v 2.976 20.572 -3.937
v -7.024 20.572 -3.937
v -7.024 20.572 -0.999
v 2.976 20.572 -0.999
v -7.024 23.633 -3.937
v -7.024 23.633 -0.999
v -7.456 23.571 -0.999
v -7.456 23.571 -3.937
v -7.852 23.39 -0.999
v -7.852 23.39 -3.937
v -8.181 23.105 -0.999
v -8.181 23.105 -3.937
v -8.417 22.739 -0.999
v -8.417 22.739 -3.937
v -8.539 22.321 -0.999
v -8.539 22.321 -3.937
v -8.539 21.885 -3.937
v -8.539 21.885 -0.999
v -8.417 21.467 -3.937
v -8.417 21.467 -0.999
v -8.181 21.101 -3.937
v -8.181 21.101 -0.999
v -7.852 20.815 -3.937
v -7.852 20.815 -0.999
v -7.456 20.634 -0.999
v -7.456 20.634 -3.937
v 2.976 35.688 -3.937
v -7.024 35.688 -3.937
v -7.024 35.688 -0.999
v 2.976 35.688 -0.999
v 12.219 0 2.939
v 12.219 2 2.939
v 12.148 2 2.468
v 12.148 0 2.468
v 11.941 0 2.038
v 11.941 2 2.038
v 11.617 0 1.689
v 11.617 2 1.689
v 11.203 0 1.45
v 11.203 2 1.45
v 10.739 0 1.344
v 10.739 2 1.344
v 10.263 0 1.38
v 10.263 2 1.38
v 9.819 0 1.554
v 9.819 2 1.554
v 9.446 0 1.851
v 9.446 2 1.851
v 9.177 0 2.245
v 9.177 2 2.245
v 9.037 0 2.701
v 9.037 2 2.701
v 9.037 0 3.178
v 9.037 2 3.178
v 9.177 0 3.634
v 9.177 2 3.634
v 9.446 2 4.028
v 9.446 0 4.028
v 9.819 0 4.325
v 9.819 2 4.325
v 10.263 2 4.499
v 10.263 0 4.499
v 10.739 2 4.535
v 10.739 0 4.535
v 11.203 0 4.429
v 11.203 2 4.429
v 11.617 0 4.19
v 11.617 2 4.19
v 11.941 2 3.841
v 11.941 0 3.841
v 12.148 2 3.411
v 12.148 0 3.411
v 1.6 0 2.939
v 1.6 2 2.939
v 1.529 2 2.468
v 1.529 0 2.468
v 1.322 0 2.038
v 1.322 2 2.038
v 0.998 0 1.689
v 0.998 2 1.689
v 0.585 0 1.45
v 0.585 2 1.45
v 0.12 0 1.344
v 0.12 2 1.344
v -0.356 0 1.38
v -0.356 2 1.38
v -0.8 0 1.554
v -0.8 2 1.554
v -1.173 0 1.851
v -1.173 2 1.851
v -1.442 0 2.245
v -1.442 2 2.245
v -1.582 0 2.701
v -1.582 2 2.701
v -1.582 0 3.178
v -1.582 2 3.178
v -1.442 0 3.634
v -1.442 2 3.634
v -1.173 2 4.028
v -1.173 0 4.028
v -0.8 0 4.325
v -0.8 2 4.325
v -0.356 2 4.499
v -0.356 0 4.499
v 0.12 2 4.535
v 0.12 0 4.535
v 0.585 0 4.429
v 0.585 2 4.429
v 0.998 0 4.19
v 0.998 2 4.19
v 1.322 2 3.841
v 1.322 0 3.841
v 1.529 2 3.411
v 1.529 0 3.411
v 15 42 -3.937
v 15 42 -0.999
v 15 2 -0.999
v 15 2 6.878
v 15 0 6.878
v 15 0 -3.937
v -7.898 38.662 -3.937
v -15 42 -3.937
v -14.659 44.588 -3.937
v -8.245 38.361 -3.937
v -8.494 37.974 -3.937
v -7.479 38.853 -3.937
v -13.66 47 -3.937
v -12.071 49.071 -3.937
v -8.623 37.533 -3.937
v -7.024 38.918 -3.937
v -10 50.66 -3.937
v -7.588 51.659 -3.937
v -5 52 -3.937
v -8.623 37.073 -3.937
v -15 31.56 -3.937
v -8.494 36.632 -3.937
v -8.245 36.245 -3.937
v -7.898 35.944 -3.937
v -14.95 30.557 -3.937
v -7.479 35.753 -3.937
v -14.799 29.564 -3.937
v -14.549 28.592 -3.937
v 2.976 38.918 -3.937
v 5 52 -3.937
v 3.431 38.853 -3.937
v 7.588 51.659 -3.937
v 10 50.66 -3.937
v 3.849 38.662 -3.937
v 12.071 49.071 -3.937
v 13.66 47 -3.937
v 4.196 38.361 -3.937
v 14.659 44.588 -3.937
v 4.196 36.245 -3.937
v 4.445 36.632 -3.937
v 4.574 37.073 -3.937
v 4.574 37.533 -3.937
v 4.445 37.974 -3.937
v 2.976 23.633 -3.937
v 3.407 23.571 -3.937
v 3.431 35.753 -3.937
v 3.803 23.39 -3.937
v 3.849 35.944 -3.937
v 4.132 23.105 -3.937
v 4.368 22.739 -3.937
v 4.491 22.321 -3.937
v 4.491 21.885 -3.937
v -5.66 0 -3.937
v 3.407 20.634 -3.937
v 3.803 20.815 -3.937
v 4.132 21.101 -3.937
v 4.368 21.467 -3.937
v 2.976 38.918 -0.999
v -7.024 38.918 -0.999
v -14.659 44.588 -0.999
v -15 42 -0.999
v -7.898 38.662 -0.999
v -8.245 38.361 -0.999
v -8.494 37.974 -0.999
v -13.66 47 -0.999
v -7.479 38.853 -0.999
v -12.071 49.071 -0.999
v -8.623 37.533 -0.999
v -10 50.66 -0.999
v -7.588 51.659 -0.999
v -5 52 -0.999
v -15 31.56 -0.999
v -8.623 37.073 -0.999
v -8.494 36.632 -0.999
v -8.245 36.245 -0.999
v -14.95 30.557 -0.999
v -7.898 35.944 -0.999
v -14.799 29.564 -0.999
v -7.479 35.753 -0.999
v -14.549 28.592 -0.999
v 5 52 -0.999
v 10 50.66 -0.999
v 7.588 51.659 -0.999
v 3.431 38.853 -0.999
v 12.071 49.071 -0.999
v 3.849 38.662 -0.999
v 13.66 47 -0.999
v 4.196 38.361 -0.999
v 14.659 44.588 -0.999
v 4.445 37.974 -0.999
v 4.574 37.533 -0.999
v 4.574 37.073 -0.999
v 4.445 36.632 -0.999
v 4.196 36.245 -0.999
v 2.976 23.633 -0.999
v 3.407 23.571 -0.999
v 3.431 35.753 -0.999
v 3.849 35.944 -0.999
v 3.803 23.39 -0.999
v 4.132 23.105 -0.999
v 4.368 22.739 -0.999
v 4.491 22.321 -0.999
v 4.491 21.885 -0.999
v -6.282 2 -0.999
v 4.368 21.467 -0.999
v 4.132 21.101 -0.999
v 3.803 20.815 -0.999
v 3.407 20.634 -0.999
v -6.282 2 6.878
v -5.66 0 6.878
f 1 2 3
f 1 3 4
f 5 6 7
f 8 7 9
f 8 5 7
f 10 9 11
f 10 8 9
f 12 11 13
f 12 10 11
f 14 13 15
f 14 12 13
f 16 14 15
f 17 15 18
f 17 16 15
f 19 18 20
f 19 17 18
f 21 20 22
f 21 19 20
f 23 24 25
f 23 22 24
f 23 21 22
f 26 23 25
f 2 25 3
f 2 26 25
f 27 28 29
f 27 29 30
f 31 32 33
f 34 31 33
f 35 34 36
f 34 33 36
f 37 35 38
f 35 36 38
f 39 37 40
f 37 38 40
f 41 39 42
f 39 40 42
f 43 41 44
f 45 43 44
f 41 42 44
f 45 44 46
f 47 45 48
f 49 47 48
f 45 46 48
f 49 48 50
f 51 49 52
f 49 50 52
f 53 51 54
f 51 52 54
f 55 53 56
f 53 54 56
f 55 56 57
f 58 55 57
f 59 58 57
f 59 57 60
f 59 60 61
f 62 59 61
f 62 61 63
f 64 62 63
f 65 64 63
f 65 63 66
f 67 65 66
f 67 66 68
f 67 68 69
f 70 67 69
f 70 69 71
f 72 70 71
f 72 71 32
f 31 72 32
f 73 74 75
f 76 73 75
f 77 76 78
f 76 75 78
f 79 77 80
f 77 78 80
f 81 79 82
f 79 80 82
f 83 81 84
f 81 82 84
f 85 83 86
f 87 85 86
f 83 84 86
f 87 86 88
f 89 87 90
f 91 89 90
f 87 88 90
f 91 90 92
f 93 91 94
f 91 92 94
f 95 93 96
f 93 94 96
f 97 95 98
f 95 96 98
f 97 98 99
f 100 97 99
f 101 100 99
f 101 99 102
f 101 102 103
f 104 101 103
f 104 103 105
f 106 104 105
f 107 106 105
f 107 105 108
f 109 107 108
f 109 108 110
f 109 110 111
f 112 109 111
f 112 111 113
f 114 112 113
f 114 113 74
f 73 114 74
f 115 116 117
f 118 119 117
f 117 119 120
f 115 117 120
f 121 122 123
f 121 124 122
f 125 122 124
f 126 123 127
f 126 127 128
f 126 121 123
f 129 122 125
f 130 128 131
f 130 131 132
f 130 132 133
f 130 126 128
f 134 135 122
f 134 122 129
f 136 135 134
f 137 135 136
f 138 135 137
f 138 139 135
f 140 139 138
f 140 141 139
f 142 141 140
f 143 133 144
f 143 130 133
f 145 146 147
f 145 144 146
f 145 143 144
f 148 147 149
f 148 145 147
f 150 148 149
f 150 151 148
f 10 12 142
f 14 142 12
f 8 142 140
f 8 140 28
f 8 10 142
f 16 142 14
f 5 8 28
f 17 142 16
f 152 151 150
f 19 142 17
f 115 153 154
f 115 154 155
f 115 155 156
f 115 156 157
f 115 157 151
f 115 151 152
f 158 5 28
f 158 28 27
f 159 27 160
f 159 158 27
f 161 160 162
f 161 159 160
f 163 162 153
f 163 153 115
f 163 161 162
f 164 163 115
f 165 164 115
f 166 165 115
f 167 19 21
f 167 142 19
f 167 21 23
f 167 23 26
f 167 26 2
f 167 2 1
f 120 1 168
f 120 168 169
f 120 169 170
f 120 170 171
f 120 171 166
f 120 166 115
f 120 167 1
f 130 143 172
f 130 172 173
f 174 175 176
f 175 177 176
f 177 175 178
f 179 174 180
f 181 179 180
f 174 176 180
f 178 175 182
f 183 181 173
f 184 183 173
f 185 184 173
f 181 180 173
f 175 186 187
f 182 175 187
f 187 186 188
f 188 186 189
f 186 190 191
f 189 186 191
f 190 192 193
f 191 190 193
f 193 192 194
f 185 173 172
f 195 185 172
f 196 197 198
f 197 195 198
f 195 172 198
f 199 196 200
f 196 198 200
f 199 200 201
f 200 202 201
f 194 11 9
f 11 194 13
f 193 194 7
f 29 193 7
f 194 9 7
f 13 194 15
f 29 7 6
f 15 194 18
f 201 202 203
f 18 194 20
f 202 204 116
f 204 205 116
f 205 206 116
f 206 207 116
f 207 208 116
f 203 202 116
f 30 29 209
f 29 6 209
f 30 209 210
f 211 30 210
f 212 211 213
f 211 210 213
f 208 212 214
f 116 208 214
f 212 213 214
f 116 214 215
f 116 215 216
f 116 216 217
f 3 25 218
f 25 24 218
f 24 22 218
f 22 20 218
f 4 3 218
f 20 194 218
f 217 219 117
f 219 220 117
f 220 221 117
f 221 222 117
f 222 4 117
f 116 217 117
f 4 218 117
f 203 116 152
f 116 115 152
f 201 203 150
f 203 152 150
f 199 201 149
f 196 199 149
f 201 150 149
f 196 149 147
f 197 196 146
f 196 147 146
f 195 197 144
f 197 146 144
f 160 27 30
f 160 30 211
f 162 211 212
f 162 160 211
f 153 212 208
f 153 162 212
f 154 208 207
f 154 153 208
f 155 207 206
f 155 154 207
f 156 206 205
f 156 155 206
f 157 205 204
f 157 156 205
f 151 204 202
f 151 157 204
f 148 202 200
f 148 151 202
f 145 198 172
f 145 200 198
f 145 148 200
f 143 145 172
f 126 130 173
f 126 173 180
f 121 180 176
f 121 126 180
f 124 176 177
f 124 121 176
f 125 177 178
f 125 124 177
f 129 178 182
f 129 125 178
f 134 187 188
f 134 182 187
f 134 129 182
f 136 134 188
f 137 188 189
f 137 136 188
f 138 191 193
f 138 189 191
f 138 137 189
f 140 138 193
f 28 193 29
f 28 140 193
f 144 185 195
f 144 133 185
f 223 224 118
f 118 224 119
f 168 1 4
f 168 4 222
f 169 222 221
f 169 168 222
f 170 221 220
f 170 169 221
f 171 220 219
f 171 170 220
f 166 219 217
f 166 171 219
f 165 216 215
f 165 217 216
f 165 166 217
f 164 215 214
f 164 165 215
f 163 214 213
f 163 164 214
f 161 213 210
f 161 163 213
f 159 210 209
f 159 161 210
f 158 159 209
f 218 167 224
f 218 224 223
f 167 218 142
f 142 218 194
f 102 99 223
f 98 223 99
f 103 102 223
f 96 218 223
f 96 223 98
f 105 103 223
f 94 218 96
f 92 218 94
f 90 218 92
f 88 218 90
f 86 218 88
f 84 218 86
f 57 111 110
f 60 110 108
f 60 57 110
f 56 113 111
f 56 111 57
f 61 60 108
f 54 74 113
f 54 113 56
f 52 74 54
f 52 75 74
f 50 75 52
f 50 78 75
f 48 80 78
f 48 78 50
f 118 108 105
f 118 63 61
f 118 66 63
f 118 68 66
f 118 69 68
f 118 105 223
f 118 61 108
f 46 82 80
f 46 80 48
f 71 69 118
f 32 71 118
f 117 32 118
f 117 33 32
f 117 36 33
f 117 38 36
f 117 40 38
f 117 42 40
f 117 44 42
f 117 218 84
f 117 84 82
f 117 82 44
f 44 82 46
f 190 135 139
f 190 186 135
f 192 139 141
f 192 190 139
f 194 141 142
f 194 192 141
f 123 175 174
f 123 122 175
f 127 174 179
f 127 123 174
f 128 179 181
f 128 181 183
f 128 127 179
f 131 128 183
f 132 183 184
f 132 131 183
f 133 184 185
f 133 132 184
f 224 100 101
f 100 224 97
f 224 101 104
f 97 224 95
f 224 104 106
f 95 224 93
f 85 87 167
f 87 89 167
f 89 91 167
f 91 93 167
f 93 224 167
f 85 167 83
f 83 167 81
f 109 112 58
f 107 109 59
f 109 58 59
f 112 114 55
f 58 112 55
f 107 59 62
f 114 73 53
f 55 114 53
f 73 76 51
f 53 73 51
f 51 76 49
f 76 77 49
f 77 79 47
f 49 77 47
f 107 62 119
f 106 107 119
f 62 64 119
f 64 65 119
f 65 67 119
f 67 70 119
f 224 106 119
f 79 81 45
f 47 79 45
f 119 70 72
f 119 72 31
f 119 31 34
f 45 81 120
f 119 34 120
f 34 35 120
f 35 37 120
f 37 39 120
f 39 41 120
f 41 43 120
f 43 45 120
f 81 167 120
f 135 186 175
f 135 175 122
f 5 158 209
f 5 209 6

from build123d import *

# Parameters (mm, degrees)
SKETCH1_W                      = 30
SKETCH1_H                      = 10.814576134
BOSS_EXTRUDE1_DEPTH            = 2
SKETCH2_W                      = 30
SKETCH2_H                      = 2.938330184
BOSS_EXTRUDE2_DEPTH            = 50
CUT_EXTRUDE1_DEPTH             = 11.814576135
CUT_EXTRUDE2_REACH             = 4
SKETCH4_R                      = 1.6
CUT_EXTRUDE3_REACH             = 8.878
CUT_EXTRUDE3_DIRECTION_2_REACH = 5.937
FILLET1_R                      = 10


with BuildPart() as part:
    # Sketch1 → Boss-Extrude1 (new body)
    with BuildSketch(Plane(origin=(0, 0, 0), x_dir=(1, 0, 0), z_dir=(0, 1, 0))):
        with Locations((0, -1.470280193)):
            Rectangle(SKETCH1_W, SKETCH1_H)
    extrude(amount=BOSS_EXTRUDE1_DEPTH)

    # Sketch2 → Boss-Extrude2 (add)
    with BuildSketch(Plane(origin=(0, 2, 0), x_dir=(1, 0, 0), z_dir=(0, 1, 0))):
        with Locations((0, 2.467842782)):
            Rectangle(SKETCH2_W, SKETCH2_H)
    extrude(amount=BOSS_EXTRUDE2_DEPTH)

    # Sketch3 → Cut-Extrude1 (cut, through all)
    with BuildSketch(Plane(origin=(0, 0, -3.937007874), x_dir=(-1, 0, 0), z_dir=(0, 0, -1))):
        with BuildLine():
            Line((-2.975613291, 38.918099038), (7.024386709, 38.918099038))
            ThreePointArc((7.024386709, 38.918099038), (8.639544063, 37.302941685), (7.024386709, 35.687784331))
            Line((7.024386709, 35.687784331), (-2.975613291, 35.687784331))
            ThreePointArc((-2.975613291, 35.687784331), (-4.590770645, 37.302941685), (-2.975613291, 38.918099038))
        make_face()
        with BuildLine():
            Line((-2.975613291, 23.633431947), (7.024386709, 23.633431947))
            ThreePointArc((7.024386709, 23.633431947), (8.554876972, 22.102941685), (7.024386709, 20.572451422))
            Line((7.024386709, 20.572451422), (-2.975613291, 20.572451422))
            ThreePointArc((-2.975613291, 20.572451422), (-4.506103554, 22.102941685), (-2.975613291, 23.633431947))
        make_face()
    extrude(amount=-CUT_EXTRUDE1_DEPTH, mode=Mode.SUBTRACT)

    # Sketch4 → Cut-Extrude2 (cut, up to next)
    with BuildSketch(Plane(origin=(0, 2, 0), x_dir=(1, 0, 0), z_dir=(0, 1, 0)), mode=Mode.PRIVATE) as cut_extrude2_sk1:
        with Locations((10.61893739, -2.939445285)):
            Circle(SKETCH4_R)
    cut_extrude2_tool1 = extrude(cut_extrude2_sk1.sketch, amount=-CUT_EXTRUDE2_REACH, mode=Mode.PRIVATE) & part.part
    add(cut_extrude2_tool1.solids().sort_by_distance((10.618937, 2, 2.939445))[0], mode=Mode.SUBTRACT)
    # Sketch4 → Cut-Extrude2 (cut, up to next)
    with BuildSketch(Plane(origin=(0, 2, 0), x_dir=(1, 0, 0), z_dir=(0, 1, 0)), mode=Mode.PRIVATE) as cut_extrude2_sk2:
        with Locations((0, -2.939445285)):
            Circle(SKETCH4_R)
    cut_extrude2_tool2 = extrude(cut_extrude2_sk2.sketch, amount=-CUT_EXTRUDE2_REACH, mode=Mode.PRIVATE) & part.part
    add(cut_extrude2_tool2.solids().sort_by_distance((0, 2, 2.939445))[0], mode=Mode.SUBTRACT)

    # Sketch5 → Cut-Extrude3 (cut, up to next)
    with BuildSketch(Plane.XY, mode=Mode.PRIVATE) as cut_extrude3_sk1:
        Polygon((-4.080923029, -5.080850433), (-16.955695167, 36.332562893), (-18.585937562, -5.080850433), align=None)
    cut_extrude3_tool1 = extrude(cut_extrude3_sk1.sketch, amount=CUT_EXTRUDE3_REACH, mode=Mode.PRIVATE) & part.part
    add(cut_extrude3_tool1.solids().sort_by_distance((-13.207519, 8.723621, 0))[0], mode=Mode.SUBTRACT)

    # Sketch5 → Cut-Extrude3 direction 2 (cut, up to next)
    with BuildSketch(Plane.XY, mode=Mode.PRIVATE) as cut_extrude3_direction_2_sk1:
        Polygon((-4.080923029, -5.080850433), (-16.955695167, 36.332562893), (-18.585937562, -5.080850433), align=None)
    cut_extrude3_direction_2_tool1 = extrude(cut_extrude3_direction_2_sk1.sketch, amount=-CUT_EXTRUDE3_DIRECTION_2_REACH, mode=Mode.PRIVATE) & part.part
    add(cut_extrude3_direction_2_tool1.solids().sort_by_distance((-13.207519, 8.723621, 0))[0], mode=Mode.SUBTRACT)

    # Fillet1
    fillet1_edges = [part.edges().sort_by_distance(p)[0] for p in [
        (15, 52, -2.467842782),
        (-15, 52, -2.467842782),
        (-15, 30.041809827, -2.467842782),
    ]]
    fillet(fillet1_edges, radius=FILLET1_R)


solid = part.part
